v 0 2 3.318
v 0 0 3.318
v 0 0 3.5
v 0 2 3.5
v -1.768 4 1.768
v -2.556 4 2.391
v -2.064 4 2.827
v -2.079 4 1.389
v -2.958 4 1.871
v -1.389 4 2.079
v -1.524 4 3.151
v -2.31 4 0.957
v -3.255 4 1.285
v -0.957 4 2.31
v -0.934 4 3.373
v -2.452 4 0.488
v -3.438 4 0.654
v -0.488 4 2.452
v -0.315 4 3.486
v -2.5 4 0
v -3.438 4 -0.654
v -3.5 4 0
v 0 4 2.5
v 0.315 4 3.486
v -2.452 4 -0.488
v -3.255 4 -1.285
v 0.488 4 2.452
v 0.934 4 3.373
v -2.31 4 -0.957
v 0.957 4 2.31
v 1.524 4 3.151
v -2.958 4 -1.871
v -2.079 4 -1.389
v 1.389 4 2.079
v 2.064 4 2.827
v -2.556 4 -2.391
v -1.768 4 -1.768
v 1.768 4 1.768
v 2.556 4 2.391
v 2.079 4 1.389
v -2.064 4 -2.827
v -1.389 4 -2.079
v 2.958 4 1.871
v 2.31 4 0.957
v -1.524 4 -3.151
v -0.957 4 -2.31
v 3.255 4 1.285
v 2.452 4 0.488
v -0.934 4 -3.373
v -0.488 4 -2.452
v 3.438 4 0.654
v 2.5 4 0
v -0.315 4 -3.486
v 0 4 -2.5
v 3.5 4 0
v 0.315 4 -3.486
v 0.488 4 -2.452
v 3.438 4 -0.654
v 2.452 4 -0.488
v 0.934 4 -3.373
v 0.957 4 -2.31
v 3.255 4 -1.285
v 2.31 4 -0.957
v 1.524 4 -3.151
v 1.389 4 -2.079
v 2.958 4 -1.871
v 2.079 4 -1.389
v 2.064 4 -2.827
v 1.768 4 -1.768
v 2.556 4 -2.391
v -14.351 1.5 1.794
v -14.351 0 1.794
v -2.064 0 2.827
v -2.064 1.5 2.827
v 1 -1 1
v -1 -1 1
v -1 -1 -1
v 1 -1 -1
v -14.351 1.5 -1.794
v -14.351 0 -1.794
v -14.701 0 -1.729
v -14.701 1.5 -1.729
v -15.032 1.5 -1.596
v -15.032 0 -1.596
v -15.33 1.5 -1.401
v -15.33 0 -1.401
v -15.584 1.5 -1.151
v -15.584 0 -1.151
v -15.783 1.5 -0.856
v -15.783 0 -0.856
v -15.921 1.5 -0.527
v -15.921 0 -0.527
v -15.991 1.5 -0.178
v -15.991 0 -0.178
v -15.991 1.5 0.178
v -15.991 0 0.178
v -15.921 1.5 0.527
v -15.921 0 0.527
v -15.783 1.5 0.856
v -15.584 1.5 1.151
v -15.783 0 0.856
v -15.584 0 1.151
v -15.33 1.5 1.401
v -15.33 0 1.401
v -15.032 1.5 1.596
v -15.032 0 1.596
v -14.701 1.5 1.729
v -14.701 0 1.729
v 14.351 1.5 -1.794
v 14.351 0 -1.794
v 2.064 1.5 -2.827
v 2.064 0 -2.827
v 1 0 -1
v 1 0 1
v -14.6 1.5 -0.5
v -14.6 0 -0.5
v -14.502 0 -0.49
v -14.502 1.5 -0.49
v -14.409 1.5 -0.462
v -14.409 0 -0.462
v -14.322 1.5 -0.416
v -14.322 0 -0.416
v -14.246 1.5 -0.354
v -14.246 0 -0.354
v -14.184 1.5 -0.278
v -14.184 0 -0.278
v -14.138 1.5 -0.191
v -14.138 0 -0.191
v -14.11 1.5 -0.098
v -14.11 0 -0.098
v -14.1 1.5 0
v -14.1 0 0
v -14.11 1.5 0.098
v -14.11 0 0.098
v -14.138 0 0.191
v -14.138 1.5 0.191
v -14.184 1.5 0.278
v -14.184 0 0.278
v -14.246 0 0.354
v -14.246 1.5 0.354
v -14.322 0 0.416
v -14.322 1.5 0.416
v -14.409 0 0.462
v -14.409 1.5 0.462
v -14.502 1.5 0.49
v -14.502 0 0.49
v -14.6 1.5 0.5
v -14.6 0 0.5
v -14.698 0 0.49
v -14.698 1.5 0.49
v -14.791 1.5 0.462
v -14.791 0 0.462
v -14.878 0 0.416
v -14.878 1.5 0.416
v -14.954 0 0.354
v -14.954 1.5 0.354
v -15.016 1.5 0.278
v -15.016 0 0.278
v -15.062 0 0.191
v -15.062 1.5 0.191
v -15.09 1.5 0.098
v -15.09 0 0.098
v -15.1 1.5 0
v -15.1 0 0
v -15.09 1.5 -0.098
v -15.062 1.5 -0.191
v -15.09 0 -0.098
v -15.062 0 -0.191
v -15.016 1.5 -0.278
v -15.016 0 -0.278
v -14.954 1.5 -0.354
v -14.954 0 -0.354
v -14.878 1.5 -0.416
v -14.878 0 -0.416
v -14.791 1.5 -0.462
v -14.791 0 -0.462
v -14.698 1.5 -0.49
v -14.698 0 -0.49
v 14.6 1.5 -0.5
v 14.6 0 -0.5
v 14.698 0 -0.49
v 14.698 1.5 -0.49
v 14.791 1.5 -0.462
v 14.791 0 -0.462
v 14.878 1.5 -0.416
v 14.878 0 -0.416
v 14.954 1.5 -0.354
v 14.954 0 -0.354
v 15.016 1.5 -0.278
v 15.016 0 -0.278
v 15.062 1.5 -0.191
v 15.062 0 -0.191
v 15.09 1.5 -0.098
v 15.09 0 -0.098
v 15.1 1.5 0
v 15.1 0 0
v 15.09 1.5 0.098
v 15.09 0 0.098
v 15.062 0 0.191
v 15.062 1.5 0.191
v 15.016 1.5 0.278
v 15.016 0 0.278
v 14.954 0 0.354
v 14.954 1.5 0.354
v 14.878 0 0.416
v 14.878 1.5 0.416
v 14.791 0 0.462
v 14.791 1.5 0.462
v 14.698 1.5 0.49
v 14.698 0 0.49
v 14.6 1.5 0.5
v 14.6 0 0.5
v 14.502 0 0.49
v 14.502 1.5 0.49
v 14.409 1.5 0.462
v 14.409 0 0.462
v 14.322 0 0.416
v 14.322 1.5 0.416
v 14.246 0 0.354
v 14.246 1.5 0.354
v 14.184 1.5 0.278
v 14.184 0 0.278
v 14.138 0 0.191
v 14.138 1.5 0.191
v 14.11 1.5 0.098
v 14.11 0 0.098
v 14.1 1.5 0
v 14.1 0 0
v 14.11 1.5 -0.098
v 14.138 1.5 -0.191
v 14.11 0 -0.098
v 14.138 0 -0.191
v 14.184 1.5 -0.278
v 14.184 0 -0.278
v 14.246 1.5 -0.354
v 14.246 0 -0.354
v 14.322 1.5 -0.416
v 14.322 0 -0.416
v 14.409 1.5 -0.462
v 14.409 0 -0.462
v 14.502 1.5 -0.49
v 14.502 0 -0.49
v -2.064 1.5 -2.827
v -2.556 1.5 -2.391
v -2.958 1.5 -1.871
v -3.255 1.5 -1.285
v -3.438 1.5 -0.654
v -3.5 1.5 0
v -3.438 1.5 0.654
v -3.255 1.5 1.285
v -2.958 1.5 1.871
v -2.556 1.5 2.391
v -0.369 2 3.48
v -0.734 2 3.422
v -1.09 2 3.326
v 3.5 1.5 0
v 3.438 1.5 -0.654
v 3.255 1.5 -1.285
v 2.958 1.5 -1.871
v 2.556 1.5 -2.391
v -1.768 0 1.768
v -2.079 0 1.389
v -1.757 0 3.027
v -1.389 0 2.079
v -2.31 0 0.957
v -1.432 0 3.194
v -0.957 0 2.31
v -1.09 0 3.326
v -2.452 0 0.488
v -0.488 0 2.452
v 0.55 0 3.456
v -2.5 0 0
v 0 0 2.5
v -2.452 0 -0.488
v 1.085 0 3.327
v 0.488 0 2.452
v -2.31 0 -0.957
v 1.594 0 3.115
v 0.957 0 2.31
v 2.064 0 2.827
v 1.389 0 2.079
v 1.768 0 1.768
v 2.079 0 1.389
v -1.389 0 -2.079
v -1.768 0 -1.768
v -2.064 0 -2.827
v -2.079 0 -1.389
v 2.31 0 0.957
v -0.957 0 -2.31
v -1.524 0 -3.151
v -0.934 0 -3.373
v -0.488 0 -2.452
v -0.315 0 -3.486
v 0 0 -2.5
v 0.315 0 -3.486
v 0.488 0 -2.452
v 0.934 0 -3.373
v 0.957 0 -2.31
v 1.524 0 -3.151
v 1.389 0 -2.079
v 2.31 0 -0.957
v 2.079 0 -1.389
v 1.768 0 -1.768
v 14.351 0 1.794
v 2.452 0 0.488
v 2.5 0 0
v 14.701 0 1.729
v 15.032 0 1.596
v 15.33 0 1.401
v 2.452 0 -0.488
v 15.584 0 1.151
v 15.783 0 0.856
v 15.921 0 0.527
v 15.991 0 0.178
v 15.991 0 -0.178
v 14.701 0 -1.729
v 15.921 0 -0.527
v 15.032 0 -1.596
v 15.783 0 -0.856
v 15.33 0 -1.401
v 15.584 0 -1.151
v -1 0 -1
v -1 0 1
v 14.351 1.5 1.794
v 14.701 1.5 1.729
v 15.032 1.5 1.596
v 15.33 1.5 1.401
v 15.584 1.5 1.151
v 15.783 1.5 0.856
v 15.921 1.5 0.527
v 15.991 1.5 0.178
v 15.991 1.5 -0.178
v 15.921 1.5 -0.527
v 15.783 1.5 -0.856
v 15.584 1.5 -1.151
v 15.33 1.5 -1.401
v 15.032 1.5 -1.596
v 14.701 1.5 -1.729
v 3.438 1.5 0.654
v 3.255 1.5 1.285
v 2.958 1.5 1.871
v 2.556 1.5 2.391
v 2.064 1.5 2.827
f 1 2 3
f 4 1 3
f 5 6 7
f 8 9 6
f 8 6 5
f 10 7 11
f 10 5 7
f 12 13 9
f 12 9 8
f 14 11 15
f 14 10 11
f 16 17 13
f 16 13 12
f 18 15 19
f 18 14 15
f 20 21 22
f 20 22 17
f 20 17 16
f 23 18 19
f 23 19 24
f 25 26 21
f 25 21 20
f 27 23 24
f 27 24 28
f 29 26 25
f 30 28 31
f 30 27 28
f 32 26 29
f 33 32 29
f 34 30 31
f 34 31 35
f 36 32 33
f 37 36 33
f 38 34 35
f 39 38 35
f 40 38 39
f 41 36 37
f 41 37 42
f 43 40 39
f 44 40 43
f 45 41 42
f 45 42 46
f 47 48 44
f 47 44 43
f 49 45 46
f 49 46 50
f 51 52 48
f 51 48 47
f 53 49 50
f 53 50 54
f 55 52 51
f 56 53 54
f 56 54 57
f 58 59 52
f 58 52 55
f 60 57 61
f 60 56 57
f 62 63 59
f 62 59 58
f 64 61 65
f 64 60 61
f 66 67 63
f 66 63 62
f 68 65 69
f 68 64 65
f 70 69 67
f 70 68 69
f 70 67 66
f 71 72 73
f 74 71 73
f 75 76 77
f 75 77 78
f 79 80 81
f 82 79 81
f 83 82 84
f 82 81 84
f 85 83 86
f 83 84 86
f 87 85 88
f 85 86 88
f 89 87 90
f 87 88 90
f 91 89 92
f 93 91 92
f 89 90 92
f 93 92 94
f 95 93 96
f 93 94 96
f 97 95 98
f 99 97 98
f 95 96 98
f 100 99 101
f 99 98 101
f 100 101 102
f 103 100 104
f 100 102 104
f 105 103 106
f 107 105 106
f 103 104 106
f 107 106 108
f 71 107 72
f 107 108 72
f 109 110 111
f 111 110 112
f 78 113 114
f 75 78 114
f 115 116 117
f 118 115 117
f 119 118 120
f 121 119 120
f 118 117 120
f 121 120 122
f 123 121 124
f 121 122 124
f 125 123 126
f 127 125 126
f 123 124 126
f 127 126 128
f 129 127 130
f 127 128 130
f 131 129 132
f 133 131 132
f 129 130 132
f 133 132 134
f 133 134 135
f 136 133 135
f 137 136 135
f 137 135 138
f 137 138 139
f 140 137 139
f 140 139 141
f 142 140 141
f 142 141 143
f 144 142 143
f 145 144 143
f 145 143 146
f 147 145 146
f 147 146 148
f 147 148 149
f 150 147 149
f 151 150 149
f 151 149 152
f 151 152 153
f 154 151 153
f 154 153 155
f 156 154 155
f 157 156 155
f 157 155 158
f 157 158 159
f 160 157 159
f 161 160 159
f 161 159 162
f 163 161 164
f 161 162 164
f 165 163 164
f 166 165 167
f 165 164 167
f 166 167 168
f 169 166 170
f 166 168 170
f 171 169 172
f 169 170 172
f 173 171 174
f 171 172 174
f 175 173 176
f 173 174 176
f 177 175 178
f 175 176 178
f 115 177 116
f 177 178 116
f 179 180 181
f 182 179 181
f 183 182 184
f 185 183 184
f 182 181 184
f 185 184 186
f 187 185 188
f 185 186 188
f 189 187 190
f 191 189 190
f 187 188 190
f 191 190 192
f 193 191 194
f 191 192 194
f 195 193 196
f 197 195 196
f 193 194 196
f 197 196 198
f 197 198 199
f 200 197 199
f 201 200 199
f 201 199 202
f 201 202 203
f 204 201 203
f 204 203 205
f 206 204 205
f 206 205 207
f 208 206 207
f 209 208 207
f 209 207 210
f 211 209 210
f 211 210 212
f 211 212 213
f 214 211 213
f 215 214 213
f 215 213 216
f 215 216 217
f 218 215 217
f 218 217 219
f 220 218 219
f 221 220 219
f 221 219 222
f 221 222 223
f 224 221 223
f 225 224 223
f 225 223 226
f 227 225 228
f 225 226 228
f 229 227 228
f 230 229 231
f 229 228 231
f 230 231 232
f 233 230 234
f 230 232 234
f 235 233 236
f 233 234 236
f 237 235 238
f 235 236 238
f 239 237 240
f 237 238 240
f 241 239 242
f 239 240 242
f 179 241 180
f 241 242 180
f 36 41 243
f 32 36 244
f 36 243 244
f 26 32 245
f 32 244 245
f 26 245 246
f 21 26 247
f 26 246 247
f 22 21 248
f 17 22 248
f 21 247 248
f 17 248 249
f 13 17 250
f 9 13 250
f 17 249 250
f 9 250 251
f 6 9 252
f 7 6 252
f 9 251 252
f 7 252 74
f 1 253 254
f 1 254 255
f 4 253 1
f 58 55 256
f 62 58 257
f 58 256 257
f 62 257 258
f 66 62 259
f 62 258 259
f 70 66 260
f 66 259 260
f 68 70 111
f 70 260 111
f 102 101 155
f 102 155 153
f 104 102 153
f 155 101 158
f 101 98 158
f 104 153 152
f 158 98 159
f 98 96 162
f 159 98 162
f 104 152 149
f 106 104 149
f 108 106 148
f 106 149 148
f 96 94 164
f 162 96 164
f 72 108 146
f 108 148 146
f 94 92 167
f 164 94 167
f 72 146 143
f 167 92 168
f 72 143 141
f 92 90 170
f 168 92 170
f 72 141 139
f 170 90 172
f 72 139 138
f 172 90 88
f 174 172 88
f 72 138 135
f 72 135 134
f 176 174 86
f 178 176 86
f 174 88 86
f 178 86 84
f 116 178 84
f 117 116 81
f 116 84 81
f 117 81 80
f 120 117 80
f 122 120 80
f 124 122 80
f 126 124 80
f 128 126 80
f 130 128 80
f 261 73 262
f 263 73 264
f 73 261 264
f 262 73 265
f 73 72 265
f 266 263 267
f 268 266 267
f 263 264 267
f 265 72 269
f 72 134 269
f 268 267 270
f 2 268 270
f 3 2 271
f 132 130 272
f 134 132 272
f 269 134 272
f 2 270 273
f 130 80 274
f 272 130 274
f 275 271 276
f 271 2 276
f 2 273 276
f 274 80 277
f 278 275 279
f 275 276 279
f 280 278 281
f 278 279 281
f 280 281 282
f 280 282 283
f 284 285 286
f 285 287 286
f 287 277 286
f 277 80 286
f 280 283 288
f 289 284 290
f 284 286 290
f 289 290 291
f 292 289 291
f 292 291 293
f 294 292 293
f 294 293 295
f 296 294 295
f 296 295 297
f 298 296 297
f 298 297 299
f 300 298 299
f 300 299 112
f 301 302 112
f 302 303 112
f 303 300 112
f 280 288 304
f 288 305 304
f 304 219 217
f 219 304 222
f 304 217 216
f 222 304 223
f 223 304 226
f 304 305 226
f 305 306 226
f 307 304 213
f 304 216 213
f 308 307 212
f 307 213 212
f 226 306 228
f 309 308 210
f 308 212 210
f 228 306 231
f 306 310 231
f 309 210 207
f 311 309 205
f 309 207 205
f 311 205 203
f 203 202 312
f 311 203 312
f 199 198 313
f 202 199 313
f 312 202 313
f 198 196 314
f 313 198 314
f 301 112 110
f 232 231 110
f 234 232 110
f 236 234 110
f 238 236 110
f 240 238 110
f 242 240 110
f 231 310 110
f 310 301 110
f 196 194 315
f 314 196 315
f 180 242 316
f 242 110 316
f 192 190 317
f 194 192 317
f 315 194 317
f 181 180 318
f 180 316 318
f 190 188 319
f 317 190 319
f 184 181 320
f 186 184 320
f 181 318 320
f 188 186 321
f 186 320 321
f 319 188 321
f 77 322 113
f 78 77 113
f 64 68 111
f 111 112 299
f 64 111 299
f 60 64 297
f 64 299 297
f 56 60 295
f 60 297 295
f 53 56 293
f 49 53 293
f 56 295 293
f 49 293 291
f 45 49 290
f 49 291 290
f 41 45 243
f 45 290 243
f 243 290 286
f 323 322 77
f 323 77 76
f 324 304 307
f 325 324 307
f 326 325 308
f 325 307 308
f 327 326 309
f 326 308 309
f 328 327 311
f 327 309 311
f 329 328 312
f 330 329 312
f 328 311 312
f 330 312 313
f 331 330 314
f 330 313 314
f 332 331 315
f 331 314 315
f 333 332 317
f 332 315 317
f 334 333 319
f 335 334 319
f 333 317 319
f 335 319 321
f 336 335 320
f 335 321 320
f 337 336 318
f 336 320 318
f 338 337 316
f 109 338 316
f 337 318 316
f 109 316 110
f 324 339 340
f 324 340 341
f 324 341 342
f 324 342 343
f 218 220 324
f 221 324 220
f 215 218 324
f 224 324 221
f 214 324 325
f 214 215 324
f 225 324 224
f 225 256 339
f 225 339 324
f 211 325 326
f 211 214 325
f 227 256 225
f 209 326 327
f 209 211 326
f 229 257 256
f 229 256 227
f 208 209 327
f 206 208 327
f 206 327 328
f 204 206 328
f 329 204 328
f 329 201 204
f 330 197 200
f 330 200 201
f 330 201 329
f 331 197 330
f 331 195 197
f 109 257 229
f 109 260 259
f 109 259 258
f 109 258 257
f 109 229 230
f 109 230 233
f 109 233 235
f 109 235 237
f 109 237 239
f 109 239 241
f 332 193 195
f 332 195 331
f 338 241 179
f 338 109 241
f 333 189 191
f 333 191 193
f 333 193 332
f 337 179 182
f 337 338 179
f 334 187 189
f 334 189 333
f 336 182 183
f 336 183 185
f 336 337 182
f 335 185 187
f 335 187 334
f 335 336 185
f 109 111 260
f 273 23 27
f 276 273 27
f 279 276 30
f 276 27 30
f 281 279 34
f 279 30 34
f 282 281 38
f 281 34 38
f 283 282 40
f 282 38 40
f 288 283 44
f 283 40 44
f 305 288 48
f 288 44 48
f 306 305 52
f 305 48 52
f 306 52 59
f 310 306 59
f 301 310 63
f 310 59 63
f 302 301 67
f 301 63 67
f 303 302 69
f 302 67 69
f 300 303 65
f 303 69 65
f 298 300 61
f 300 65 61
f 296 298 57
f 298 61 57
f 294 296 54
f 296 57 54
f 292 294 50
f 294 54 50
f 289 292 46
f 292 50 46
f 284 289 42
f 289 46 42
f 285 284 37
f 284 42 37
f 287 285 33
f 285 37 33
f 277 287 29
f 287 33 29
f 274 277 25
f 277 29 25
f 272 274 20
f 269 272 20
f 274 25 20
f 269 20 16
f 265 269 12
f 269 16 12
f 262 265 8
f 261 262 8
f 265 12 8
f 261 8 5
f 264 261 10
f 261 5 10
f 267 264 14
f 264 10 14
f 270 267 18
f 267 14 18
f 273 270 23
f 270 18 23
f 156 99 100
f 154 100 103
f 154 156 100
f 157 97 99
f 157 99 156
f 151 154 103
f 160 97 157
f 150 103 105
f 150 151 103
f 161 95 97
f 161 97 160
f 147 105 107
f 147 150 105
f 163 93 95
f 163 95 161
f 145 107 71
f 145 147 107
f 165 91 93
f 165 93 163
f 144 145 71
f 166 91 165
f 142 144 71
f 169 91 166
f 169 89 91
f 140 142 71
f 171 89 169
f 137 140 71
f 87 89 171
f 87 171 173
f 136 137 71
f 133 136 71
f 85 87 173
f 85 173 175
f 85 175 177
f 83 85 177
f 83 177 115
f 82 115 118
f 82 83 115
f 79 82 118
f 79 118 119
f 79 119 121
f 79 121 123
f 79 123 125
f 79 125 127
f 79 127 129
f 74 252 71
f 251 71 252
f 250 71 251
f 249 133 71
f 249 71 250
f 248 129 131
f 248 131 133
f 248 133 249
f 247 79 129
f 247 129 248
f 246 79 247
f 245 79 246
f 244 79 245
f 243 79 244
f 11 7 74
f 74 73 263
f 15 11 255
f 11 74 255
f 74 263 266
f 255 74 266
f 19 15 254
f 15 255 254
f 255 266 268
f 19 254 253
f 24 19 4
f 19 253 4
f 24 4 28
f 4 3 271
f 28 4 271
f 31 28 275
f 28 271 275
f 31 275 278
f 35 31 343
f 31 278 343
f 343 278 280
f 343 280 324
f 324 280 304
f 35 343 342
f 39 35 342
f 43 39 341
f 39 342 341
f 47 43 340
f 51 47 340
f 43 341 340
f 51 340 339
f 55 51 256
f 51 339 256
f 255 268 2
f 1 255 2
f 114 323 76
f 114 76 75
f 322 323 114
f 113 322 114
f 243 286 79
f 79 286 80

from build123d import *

# Parameters (mm, degrees)
EXTRUDE_1_DEPTH     = 1.5
EXTRUDE_1_2_DEPTH   = 1.5
SKETCH_1_4_R        = 3.499752311
EXTRUDE_2_DEPTH     = 4
SKETCH_2_R          = 2.5
CUT_EXTRUDE_1_DEPTH = 4
SKETCH_3_R          = 0.5
CUT_EXTRUDE_2_DEPTH = 4
CUT_EXTRUDE_3_DEPTH = 2
SKETCH_5_W          = 2
SKETCH_5_H          = 2
EXTRUDE_3_DEPTH     = 1


with BuildPart() as part:
    # 草图1 → 凸台-拉伸1 (new body)
    with BuildSketch(Plane(origin=(0, 0, 0), x_dir=(1, 0, 0), z_dir=(0, 1, 0))):
        with BuildLine():
            Line((2.063744522, -2.826521676), (14.350776204, -1.793674033))
            ThreePointArc((14.350776204, -1.793674033), (16, 0), (14.350776204, 1.793674033))
            Line((14.350776204, 1.793674033), (2.063744522, 2.826521676))
            ThreePointArc((2.063744522, 2.826521676), (3.499752311, 0), (2.063744522, -2.826521676))
        make_face()
    extrude(amount=EXTRUDE_1_DEPTH)



with BuildPart() as body_2:
    # 草图1 → Extrude 1 2 (new body)
    with BuildSketch(Plane(origin=(0, 0, 0), x_dir=(1, 0, 0), z_dir=(0, 1, 0))):
        with BuildLine():
            ThreePointArc((-2.063744522, -2.826521676), (-3.499752311, 0), (-2.063744522, 2.826521676))
            Line((-2.063744522, 2.826521676), (-14.350776204, 1.793674033))
            ThreePointArc((-14.350776204, 1.793674033), (-16, 0), (-14.350776204, -1.793674033))
            Line((-14.350776204, -1.793674033), (-2.063744522, -2.826521676))
        make_face()
    extrude(amount=EXTRUDE_1_2_DEPTH)


with BuildPart() as part_1:
    add(part.part)

    add(body_2.part)  # 凸台-拉伸2 merges body 2
    # 草图1<4> → 凸台-拉伸2 (add)
    with BuildSketch(Plane(origin=(0, 0, 0), x_dir=(1, 0, 0), z_dir=(0, 1, 0))):
        Circle(SKETCH_1_4_R)
    extrude(amount=EXTRUDE_2_DEPTH)

    # 草图2 → 切除-拉伸1 (cut)
    with BuildSketch(Plane(origin=(0, 4, 0), x_dir=(1, 0, 0), z_dir=(0, 1, 0))):
        Circle(SKETCH_2_R)
    extrude(amount=-CUT_EXTRUDE_1_DEPTH, mode=Mode.SUBTRACT)

    # 草图3 → 切除-拉伸2 (cut)
    with BuildSketch(Plane.XZ):
        with Locations((14.6, 0)):
            Circle(SKETCH_3_R)
        with Locations((-14.6, 0)):
            Circle(SKETCH_3_R)
    extrude(amount=-CUT_EXTRUDE_2_DEPTH, mode=Mode.SUBTRACT)

    # 草图4 → 切除-拉伸3 (cut)
    with BuildSketch(Plane.XZ):
        with BuildLine():
            Line((-1.090127756, 3.325640948), (0, 3.317539819))
            Line((0, 3.317539819), (0, 3.499752311))
            ThreePointArc((0, 3.499752311), (-0.551972212, 3.455950363), (-1.090127756, 3.325640948))
        make_face()
    extrude(amount=-CUT_EXTRUDE_3_DEPTH, mode=Mode.SUBTRACT)


with BuildPart() as body_2_2:
    # 草图5 → 凸台-拉伸3 (new body)
    with BuildSketch(Plane.XZ):
        Rectangle(SKETCH_5_W, SKETCH_5_H)
    extrude(amount=EXTRUDE_3_DEPTH)


solid = Compound([part_1.part, body_2_2.part])
